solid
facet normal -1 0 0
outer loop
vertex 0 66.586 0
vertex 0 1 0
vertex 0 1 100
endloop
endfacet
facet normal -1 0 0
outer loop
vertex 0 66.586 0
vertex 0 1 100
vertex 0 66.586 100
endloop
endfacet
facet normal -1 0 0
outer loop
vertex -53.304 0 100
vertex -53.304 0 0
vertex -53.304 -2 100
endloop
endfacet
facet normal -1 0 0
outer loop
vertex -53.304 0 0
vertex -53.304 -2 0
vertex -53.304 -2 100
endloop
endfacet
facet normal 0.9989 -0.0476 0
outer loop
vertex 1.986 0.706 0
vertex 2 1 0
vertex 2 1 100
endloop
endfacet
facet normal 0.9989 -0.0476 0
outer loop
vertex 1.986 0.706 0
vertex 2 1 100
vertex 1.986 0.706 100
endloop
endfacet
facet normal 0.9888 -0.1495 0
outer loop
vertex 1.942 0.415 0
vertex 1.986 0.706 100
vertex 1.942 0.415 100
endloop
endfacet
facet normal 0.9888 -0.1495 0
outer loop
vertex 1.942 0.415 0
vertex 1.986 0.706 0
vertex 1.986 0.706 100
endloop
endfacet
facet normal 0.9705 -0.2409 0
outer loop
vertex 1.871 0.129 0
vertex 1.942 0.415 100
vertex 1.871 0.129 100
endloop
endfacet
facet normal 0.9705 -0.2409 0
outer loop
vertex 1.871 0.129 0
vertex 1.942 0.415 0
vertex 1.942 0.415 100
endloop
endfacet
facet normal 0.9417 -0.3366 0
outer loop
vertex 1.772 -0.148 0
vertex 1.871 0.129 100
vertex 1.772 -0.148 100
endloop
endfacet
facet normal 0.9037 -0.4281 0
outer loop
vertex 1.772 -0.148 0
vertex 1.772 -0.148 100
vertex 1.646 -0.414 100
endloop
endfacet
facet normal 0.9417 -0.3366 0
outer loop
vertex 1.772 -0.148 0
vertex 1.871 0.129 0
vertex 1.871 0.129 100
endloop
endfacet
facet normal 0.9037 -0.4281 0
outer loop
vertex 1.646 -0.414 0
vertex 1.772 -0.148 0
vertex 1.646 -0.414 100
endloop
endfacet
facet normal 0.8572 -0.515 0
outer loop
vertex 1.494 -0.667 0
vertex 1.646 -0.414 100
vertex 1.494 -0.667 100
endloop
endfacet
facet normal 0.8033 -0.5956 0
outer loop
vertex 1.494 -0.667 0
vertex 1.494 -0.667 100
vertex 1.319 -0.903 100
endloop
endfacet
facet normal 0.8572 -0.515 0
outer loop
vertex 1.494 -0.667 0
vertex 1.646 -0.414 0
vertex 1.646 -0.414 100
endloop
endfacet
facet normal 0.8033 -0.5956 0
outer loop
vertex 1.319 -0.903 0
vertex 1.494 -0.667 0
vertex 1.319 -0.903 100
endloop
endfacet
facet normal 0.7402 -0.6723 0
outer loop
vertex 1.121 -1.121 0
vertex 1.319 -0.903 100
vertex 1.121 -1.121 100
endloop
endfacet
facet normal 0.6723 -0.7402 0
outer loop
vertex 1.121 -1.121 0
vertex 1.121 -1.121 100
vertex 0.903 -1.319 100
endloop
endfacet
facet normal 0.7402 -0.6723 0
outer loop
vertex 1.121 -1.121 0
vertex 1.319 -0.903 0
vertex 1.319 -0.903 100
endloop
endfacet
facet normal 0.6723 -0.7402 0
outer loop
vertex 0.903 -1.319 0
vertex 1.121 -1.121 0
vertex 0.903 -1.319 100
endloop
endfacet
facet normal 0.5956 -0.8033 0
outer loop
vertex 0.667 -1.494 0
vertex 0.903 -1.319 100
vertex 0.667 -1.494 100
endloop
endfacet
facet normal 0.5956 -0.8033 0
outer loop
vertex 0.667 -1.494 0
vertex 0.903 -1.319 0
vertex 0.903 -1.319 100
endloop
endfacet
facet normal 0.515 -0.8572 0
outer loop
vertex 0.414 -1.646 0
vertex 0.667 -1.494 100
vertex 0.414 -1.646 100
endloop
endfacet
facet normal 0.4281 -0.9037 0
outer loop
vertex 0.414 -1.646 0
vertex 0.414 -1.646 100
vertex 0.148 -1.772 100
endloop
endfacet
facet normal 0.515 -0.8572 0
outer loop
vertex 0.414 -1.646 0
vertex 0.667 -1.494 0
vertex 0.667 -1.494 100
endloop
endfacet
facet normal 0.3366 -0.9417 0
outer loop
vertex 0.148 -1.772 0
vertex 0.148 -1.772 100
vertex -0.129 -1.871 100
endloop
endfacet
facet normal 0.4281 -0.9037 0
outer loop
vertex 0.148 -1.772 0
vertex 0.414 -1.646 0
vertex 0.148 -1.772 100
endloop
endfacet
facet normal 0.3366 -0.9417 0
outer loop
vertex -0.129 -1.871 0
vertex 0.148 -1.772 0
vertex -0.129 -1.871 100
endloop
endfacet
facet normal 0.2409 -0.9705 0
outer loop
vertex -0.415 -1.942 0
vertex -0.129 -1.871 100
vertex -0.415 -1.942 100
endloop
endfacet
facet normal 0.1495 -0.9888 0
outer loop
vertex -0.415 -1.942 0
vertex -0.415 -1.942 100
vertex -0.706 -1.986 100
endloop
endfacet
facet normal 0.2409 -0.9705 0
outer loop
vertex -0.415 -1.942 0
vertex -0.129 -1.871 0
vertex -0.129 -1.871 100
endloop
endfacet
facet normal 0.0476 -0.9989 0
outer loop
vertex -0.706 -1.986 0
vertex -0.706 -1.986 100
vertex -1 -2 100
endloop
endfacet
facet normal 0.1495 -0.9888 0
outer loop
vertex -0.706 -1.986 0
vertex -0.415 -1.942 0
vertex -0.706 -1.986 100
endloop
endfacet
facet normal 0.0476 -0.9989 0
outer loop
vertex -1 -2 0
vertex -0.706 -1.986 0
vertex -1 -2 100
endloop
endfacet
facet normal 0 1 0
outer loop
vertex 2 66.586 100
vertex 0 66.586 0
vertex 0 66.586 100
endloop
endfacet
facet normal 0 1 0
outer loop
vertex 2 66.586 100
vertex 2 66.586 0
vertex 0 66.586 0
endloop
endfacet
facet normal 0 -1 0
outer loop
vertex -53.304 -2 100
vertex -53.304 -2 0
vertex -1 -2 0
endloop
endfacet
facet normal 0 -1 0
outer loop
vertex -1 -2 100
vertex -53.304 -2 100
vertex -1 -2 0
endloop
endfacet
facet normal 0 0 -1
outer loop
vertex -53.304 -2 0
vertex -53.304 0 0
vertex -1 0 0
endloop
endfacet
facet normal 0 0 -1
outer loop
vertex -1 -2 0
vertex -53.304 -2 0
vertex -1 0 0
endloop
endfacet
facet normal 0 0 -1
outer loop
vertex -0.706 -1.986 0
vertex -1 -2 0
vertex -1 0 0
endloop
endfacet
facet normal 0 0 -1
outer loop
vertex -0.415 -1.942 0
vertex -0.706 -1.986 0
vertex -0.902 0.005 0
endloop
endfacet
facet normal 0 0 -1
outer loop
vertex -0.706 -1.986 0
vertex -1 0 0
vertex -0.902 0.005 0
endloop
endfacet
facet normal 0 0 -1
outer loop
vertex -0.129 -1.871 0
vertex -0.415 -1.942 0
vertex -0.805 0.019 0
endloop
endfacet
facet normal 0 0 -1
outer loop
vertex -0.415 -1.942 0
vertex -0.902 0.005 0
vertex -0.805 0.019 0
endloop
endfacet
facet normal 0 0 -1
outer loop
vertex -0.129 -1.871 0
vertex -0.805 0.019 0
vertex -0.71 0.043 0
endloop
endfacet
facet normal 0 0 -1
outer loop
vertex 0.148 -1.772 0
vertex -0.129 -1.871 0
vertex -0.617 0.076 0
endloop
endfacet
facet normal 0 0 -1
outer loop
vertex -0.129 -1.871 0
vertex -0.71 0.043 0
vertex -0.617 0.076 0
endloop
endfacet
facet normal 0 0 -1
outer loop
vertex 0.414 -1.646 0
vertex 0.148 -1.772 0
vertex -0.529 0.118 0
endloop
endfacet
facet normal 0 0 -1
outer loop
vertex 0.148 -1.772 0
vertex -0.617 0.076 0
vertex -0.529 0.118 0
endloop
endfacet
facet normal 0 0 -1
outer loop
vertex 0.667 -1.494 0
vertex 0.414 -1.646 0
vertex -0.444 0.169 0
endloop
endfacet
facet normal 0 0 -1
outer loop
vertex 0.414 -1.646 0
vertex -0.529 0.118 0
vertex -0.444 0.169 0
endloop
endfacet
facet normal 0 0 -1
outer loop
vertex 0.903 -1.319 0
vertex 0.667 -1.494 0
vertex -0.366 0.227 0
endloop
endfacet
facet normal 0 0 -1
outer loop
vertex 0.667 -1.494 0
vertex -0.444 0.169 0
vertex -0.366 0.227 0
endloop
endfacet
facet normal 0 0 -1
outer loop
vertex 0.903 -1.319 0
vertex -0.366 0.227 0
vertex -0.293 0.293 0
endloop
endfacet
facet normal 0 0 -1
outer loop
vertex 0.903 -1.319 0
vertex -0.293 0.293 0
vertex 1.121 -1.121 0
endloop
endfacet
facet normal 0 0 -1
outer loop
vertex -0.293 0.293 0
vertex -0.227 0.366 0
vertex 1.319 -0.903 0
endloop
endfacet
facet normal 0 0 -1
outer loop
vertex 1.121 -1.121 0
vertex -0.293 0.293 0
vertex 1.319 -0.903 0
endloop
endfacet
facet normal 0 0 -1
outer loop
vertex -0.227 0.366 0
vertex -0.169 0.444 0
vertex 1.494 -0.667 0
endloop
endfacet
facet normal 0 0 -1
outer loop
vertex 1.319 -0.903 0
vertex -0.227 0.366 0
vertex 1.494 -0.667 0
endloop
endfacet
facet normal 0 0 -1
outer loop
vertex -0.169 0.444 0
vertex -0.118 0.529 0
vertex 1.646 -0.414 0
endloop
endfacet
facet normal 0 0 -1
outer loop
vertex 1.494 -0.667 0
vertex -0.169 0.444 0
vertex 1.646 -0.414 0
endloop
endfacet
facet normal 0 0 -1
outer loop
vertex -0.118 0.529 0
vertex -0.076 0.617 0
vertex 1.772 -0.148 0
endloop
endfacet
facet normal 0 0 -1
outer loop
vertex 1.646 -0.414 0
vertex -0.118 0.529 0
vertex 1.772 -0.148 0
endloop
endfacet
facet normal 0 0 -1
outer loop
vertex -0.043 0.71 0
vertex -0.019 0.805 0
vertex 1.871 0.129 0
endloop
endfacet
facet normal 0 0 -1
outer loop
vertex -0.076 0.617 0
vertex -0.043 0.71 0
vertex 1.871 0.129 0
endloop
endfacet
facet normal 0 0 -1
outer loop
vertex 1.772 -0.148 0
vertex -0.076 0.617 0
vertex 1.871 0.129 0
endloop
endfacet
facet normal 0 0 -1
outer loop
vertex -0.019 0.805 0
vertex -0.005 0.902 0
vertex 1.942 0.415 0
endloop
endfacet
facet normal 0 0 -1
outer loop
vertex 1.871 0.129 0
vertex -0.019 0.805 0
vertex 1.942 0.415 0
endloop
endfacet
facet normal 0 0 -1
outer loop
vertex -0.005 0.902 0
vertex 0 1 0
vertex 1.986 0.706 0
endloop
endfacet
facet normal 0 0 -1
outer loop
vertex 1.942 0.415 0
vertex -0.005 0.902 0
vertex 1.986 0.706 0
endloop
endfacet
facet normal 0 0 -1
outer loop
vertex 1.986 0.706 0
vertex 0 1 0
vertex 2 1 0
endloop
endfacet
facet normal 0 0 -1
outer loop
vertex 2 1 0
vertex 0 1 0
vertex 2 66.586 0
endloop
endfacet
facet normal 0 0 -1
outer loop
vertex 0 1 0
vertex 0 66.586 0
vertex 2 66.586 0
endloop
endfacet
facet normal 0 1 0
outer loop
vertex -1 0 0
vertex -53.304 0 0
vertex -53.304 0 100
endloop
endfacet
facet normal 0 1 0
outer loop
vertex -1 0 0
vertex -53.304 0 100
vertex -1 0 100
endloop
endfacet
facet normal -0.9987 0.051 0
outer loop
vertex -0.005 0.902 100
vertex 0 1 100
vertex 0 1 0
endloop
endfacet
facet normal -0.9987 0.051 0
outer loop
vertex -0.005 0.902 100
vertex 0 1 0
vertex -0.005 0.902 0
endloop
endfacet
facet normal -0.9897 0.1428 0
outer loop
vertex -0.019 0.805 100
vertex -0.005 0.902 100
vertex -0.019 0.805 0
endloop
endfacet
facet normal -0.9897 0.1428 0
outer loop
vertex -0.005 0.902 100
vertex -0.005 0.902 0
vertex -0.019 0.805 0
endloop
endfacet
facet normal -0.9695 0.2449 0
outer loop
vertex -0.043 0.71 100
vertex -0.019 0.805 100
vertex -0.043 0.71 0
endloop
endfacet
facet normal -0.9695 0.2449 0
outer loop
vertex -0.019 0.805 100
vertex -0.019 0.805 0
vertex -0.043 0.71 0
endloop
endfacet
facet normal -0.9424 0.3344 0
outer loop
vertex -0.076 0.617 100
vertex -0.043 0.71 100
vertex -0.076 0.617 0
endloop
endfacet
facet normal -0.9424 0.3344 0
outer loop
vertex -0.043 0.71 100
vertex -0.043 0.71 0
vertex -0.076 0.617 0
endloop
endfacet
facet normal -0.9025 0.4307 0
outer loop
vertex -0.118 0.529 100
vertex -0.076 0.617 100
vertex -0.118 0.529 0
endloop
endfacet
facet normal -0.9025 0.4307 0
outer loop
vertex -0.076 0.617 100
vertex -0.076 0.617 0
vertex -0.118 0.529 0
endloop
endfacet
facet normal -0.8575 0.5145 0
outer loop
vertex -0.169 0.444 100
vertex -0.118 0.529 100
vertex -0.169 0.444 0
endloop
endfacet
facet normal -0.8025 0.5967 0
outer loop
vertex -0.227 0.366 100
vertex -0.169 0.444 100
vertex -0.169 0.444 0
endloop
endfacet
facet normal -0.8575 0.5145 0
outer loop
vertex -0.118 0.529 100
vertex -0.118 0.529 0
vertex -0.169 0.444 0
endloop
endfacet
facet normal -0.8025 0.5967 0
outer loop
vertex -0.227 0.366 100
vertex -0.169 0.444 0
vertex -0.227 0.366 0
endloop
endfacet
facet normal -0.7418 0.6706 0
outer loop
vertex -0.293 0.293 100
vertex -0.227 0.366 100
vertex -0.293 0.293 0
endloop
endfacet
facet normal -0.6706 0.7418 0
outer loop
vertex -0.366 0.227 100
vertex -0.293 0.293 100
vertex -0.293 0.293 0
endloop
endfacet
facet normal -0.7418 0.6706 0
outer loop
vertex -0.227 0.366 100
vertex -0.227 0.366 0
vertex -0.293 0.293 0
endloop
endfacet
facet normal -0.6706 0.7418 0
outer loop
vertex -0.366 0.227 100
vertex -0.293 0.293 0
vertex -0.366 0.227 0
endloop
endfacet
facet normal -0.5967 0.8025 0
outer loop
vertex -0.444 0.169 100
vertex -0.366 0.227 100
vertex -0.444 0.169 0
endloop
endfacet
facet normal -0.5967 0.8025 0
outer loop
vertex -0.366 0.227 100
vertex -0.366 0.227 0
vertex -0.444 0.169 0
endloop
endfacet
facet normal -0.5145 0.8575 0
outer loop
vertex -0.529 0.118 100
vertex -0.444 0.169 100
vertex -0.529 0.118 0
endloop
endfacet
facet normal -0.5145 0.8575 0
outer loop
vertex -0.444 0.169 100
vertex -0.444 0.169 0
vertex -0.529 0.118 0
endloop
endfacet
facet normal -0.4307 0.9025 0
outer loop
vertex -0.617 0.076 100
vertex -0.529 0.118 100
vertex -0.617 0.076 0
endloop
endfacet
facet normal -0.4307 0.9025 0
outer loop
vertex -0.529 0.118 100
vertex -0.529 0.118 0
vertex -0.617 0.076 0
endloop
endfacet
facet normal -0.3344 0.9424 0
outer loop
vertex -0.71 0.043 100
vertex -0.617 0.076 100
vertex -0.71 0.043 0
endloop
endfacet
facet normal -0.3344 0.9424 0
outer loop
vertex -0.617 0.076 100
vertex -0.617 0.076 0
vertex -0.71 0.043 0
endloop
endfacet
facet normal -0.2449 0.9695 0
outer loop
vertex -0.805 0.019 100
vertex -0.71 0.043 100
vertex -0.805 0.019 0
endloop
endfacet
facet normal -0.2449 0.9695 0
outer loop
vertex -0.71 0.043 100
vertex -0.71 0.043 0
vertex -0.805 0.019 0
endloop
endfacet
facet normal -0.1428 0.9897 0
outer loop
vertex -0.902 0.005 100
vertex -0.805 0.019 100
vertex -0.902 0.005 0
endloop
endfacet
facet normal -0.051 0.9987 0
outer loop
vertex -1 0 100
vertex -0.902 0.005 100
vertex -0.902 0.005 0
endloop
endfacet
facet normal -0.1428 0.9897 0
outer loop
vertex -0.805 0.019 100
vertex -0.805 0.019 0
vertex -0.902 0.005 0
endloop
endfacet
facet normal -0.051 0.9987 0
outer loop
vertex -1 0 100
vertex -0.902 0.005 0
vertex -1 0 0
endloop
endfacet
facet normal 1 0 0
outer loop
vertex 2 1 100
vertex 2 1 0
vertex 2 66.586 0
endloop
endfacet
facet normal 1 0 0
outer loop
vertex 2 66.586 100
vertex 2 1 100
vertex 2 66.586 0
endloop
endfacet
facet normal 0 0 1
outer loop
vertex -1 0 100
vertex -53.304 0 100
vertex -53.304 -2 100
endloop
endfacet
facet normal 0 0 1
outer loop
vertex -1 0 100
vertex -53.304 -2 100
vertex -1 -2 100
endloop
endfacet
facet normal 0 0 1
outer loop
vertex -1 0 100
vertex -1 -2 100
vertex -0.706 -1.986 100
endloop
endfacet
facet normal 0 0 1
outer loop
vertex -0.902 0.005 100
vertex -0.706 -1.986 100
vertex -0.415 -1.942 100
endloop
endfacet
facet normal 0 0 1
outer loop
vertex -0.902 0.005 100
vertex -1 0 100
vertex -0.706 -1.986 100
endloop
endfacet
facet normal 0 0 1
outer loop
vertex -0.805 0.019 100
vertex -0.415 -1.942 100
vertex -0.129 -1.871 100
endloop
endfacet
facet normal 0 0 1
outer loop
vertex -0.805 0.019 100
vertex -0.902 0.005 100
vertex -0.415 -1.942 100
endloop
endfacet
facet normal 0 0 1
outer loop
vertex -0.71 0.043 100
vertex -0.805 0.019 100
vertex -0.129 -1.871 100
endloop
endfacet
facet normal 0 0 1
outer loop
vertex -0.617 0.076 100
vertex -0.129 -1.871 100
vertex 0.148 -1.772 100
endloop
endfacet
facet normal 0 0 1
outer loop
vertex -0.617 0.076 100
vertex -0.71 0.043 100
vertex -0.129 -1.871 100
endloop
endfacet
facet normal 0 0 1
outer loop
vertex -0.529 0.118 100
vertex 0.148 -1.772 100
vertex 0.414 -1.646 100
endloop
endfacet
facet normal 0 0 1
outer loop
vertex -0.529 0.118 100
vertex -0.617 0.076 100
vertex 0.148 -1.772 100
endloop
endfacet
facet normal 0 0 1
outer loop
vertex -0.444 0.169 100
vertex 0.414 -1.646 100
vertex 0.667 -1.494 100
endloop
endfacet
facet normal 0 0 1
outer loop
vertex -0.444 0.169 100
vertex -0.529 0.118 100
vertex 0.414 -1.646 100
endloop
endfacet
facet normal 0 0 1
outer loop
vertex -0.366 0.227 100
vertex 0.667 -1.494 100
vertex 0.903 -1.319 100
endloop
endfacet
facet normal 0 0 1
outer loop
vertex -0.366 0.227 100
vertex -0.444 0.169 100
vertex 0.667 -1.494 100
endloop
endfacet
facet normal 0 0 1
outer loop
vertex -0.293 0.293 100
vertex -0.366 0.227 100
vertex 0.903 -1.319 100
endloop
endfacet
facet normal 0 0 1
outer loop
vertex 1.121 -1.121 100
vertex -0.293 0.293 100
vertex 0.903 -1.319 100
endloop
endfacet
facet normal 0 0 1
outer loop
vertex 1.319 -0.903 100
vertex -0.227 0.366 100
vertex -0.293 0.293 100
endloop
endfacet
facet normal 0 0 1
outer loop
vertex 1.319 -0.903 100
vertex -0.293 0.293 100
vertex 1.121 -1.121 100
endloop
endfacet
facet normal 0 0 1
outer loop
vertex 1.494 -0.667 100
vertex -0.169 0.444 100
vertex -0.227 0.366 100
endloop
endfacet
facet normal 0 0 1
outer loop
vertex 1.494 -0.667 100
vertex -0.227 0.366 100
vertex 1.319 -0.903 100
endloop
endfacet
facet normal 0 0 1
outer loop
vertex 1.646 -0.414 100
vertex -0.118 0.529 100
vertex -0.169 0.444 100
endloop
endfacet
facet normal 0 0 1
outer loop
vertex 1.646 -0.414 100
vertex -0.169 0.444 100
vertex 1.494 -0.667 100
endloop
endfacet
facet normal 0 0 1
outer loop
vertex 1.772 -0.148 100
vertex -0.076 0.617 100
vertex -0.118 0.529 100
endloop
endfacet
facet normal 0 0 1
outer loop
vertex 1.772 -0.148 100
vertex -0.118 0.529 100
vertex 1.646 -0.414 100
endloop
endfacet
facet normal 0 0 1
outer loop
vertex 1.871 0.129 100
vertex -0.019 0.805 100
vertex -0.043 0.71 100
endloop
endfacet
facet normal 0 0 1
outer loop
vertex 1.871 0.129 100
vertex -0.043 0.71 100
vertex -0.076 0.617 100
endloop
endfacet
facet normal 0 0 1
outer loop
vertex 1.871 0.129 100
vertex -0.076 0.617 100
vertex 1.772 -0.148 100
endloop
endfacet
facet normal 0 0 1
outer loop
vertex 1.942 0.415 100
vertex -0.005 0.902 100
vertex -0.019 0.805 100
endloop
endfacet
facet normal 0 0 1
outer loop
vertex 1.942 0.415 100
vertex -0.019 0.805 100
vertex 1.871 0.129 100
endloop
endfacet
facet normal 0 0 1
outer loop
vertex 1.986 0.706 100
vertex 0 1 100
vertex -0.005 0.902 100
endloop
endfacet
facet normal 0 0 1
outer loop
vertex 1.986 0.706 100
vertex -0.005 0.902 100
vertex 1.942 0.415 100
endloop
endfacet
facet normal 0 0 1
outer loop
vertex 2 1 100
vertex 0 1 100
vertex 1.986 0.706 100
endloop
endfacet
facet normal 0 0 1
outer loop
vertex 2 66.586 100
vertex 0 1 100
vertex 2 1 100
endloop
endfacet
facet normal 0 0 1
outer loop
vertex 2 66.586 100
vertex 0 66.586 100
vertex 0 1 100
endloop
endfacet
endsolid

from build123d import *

# Parameters (mm, degrees)
SHEET_EXTRUDE_1_1_DEPTH = 100
THICKEN_1_T2            = 2
SHEET_METAL_1_DEPTH     = 100
SHEET_METAL_1_2_DEPTH   = 100


# Read off the part's stored shape, not the designer's step: Преобразовать-Твердое тело1
with BuildPart() as body_1:
    # Sheet Extrude 1: a surface, the sketch's curves swept straight by 100 mm
    with BuildLine(Plane.XY, mode=Mode.PRIVATE) as sheet_extrude_1_1_path:
        Line((-53.303838415, 0), (0, 0))
        Line((0, 0), (0, 66.585525728))
    sheet_extrude_1_1 = Shell.extrude(sheet_extrude_1_1_path.wire(), (0 * SHEET_EXTRUDE_1_1_DEPTH, 0 * SHEET_EXTRUDE_1_1_DEPTH, 1 * SHEET_EXTRUDE_1_1_DEPTH))
    add(Solid.thicken(sheet_extrude_1_1, -THICKEN_1_T2))

    # Sheet Metal 1 outline → Sheet Metal 1 (cut)
    with BuildSketch(Plane.XY):
        with BuildLine():
            Line((2, -2), (2, 1))
            ThreePointArc((2, 1), (1.121320344, -1.121320344), (-1, -2))
            Line((-1, -2), (2, -2))
        make_face()
    extrude(amount=SHEET_METAL_1_DEPTH, mode=Mode.SUBTRACT)

    # Sheet Metal 1 2 outline → Sheet Metal 1 2 (add)
    with BuildSketch(Plane.XY):
        with BuildLine():
            Line((0, 0), (0, 1))
            ThreePointArc((0, 1), (-0.292893219, 0.292893219), (-1, 0))
            Line((-1, 0), (0, 0))
        make_face()
    extrude(amount=SHEET_METAL_1_2_DEPTH)


solid = body_1.part
